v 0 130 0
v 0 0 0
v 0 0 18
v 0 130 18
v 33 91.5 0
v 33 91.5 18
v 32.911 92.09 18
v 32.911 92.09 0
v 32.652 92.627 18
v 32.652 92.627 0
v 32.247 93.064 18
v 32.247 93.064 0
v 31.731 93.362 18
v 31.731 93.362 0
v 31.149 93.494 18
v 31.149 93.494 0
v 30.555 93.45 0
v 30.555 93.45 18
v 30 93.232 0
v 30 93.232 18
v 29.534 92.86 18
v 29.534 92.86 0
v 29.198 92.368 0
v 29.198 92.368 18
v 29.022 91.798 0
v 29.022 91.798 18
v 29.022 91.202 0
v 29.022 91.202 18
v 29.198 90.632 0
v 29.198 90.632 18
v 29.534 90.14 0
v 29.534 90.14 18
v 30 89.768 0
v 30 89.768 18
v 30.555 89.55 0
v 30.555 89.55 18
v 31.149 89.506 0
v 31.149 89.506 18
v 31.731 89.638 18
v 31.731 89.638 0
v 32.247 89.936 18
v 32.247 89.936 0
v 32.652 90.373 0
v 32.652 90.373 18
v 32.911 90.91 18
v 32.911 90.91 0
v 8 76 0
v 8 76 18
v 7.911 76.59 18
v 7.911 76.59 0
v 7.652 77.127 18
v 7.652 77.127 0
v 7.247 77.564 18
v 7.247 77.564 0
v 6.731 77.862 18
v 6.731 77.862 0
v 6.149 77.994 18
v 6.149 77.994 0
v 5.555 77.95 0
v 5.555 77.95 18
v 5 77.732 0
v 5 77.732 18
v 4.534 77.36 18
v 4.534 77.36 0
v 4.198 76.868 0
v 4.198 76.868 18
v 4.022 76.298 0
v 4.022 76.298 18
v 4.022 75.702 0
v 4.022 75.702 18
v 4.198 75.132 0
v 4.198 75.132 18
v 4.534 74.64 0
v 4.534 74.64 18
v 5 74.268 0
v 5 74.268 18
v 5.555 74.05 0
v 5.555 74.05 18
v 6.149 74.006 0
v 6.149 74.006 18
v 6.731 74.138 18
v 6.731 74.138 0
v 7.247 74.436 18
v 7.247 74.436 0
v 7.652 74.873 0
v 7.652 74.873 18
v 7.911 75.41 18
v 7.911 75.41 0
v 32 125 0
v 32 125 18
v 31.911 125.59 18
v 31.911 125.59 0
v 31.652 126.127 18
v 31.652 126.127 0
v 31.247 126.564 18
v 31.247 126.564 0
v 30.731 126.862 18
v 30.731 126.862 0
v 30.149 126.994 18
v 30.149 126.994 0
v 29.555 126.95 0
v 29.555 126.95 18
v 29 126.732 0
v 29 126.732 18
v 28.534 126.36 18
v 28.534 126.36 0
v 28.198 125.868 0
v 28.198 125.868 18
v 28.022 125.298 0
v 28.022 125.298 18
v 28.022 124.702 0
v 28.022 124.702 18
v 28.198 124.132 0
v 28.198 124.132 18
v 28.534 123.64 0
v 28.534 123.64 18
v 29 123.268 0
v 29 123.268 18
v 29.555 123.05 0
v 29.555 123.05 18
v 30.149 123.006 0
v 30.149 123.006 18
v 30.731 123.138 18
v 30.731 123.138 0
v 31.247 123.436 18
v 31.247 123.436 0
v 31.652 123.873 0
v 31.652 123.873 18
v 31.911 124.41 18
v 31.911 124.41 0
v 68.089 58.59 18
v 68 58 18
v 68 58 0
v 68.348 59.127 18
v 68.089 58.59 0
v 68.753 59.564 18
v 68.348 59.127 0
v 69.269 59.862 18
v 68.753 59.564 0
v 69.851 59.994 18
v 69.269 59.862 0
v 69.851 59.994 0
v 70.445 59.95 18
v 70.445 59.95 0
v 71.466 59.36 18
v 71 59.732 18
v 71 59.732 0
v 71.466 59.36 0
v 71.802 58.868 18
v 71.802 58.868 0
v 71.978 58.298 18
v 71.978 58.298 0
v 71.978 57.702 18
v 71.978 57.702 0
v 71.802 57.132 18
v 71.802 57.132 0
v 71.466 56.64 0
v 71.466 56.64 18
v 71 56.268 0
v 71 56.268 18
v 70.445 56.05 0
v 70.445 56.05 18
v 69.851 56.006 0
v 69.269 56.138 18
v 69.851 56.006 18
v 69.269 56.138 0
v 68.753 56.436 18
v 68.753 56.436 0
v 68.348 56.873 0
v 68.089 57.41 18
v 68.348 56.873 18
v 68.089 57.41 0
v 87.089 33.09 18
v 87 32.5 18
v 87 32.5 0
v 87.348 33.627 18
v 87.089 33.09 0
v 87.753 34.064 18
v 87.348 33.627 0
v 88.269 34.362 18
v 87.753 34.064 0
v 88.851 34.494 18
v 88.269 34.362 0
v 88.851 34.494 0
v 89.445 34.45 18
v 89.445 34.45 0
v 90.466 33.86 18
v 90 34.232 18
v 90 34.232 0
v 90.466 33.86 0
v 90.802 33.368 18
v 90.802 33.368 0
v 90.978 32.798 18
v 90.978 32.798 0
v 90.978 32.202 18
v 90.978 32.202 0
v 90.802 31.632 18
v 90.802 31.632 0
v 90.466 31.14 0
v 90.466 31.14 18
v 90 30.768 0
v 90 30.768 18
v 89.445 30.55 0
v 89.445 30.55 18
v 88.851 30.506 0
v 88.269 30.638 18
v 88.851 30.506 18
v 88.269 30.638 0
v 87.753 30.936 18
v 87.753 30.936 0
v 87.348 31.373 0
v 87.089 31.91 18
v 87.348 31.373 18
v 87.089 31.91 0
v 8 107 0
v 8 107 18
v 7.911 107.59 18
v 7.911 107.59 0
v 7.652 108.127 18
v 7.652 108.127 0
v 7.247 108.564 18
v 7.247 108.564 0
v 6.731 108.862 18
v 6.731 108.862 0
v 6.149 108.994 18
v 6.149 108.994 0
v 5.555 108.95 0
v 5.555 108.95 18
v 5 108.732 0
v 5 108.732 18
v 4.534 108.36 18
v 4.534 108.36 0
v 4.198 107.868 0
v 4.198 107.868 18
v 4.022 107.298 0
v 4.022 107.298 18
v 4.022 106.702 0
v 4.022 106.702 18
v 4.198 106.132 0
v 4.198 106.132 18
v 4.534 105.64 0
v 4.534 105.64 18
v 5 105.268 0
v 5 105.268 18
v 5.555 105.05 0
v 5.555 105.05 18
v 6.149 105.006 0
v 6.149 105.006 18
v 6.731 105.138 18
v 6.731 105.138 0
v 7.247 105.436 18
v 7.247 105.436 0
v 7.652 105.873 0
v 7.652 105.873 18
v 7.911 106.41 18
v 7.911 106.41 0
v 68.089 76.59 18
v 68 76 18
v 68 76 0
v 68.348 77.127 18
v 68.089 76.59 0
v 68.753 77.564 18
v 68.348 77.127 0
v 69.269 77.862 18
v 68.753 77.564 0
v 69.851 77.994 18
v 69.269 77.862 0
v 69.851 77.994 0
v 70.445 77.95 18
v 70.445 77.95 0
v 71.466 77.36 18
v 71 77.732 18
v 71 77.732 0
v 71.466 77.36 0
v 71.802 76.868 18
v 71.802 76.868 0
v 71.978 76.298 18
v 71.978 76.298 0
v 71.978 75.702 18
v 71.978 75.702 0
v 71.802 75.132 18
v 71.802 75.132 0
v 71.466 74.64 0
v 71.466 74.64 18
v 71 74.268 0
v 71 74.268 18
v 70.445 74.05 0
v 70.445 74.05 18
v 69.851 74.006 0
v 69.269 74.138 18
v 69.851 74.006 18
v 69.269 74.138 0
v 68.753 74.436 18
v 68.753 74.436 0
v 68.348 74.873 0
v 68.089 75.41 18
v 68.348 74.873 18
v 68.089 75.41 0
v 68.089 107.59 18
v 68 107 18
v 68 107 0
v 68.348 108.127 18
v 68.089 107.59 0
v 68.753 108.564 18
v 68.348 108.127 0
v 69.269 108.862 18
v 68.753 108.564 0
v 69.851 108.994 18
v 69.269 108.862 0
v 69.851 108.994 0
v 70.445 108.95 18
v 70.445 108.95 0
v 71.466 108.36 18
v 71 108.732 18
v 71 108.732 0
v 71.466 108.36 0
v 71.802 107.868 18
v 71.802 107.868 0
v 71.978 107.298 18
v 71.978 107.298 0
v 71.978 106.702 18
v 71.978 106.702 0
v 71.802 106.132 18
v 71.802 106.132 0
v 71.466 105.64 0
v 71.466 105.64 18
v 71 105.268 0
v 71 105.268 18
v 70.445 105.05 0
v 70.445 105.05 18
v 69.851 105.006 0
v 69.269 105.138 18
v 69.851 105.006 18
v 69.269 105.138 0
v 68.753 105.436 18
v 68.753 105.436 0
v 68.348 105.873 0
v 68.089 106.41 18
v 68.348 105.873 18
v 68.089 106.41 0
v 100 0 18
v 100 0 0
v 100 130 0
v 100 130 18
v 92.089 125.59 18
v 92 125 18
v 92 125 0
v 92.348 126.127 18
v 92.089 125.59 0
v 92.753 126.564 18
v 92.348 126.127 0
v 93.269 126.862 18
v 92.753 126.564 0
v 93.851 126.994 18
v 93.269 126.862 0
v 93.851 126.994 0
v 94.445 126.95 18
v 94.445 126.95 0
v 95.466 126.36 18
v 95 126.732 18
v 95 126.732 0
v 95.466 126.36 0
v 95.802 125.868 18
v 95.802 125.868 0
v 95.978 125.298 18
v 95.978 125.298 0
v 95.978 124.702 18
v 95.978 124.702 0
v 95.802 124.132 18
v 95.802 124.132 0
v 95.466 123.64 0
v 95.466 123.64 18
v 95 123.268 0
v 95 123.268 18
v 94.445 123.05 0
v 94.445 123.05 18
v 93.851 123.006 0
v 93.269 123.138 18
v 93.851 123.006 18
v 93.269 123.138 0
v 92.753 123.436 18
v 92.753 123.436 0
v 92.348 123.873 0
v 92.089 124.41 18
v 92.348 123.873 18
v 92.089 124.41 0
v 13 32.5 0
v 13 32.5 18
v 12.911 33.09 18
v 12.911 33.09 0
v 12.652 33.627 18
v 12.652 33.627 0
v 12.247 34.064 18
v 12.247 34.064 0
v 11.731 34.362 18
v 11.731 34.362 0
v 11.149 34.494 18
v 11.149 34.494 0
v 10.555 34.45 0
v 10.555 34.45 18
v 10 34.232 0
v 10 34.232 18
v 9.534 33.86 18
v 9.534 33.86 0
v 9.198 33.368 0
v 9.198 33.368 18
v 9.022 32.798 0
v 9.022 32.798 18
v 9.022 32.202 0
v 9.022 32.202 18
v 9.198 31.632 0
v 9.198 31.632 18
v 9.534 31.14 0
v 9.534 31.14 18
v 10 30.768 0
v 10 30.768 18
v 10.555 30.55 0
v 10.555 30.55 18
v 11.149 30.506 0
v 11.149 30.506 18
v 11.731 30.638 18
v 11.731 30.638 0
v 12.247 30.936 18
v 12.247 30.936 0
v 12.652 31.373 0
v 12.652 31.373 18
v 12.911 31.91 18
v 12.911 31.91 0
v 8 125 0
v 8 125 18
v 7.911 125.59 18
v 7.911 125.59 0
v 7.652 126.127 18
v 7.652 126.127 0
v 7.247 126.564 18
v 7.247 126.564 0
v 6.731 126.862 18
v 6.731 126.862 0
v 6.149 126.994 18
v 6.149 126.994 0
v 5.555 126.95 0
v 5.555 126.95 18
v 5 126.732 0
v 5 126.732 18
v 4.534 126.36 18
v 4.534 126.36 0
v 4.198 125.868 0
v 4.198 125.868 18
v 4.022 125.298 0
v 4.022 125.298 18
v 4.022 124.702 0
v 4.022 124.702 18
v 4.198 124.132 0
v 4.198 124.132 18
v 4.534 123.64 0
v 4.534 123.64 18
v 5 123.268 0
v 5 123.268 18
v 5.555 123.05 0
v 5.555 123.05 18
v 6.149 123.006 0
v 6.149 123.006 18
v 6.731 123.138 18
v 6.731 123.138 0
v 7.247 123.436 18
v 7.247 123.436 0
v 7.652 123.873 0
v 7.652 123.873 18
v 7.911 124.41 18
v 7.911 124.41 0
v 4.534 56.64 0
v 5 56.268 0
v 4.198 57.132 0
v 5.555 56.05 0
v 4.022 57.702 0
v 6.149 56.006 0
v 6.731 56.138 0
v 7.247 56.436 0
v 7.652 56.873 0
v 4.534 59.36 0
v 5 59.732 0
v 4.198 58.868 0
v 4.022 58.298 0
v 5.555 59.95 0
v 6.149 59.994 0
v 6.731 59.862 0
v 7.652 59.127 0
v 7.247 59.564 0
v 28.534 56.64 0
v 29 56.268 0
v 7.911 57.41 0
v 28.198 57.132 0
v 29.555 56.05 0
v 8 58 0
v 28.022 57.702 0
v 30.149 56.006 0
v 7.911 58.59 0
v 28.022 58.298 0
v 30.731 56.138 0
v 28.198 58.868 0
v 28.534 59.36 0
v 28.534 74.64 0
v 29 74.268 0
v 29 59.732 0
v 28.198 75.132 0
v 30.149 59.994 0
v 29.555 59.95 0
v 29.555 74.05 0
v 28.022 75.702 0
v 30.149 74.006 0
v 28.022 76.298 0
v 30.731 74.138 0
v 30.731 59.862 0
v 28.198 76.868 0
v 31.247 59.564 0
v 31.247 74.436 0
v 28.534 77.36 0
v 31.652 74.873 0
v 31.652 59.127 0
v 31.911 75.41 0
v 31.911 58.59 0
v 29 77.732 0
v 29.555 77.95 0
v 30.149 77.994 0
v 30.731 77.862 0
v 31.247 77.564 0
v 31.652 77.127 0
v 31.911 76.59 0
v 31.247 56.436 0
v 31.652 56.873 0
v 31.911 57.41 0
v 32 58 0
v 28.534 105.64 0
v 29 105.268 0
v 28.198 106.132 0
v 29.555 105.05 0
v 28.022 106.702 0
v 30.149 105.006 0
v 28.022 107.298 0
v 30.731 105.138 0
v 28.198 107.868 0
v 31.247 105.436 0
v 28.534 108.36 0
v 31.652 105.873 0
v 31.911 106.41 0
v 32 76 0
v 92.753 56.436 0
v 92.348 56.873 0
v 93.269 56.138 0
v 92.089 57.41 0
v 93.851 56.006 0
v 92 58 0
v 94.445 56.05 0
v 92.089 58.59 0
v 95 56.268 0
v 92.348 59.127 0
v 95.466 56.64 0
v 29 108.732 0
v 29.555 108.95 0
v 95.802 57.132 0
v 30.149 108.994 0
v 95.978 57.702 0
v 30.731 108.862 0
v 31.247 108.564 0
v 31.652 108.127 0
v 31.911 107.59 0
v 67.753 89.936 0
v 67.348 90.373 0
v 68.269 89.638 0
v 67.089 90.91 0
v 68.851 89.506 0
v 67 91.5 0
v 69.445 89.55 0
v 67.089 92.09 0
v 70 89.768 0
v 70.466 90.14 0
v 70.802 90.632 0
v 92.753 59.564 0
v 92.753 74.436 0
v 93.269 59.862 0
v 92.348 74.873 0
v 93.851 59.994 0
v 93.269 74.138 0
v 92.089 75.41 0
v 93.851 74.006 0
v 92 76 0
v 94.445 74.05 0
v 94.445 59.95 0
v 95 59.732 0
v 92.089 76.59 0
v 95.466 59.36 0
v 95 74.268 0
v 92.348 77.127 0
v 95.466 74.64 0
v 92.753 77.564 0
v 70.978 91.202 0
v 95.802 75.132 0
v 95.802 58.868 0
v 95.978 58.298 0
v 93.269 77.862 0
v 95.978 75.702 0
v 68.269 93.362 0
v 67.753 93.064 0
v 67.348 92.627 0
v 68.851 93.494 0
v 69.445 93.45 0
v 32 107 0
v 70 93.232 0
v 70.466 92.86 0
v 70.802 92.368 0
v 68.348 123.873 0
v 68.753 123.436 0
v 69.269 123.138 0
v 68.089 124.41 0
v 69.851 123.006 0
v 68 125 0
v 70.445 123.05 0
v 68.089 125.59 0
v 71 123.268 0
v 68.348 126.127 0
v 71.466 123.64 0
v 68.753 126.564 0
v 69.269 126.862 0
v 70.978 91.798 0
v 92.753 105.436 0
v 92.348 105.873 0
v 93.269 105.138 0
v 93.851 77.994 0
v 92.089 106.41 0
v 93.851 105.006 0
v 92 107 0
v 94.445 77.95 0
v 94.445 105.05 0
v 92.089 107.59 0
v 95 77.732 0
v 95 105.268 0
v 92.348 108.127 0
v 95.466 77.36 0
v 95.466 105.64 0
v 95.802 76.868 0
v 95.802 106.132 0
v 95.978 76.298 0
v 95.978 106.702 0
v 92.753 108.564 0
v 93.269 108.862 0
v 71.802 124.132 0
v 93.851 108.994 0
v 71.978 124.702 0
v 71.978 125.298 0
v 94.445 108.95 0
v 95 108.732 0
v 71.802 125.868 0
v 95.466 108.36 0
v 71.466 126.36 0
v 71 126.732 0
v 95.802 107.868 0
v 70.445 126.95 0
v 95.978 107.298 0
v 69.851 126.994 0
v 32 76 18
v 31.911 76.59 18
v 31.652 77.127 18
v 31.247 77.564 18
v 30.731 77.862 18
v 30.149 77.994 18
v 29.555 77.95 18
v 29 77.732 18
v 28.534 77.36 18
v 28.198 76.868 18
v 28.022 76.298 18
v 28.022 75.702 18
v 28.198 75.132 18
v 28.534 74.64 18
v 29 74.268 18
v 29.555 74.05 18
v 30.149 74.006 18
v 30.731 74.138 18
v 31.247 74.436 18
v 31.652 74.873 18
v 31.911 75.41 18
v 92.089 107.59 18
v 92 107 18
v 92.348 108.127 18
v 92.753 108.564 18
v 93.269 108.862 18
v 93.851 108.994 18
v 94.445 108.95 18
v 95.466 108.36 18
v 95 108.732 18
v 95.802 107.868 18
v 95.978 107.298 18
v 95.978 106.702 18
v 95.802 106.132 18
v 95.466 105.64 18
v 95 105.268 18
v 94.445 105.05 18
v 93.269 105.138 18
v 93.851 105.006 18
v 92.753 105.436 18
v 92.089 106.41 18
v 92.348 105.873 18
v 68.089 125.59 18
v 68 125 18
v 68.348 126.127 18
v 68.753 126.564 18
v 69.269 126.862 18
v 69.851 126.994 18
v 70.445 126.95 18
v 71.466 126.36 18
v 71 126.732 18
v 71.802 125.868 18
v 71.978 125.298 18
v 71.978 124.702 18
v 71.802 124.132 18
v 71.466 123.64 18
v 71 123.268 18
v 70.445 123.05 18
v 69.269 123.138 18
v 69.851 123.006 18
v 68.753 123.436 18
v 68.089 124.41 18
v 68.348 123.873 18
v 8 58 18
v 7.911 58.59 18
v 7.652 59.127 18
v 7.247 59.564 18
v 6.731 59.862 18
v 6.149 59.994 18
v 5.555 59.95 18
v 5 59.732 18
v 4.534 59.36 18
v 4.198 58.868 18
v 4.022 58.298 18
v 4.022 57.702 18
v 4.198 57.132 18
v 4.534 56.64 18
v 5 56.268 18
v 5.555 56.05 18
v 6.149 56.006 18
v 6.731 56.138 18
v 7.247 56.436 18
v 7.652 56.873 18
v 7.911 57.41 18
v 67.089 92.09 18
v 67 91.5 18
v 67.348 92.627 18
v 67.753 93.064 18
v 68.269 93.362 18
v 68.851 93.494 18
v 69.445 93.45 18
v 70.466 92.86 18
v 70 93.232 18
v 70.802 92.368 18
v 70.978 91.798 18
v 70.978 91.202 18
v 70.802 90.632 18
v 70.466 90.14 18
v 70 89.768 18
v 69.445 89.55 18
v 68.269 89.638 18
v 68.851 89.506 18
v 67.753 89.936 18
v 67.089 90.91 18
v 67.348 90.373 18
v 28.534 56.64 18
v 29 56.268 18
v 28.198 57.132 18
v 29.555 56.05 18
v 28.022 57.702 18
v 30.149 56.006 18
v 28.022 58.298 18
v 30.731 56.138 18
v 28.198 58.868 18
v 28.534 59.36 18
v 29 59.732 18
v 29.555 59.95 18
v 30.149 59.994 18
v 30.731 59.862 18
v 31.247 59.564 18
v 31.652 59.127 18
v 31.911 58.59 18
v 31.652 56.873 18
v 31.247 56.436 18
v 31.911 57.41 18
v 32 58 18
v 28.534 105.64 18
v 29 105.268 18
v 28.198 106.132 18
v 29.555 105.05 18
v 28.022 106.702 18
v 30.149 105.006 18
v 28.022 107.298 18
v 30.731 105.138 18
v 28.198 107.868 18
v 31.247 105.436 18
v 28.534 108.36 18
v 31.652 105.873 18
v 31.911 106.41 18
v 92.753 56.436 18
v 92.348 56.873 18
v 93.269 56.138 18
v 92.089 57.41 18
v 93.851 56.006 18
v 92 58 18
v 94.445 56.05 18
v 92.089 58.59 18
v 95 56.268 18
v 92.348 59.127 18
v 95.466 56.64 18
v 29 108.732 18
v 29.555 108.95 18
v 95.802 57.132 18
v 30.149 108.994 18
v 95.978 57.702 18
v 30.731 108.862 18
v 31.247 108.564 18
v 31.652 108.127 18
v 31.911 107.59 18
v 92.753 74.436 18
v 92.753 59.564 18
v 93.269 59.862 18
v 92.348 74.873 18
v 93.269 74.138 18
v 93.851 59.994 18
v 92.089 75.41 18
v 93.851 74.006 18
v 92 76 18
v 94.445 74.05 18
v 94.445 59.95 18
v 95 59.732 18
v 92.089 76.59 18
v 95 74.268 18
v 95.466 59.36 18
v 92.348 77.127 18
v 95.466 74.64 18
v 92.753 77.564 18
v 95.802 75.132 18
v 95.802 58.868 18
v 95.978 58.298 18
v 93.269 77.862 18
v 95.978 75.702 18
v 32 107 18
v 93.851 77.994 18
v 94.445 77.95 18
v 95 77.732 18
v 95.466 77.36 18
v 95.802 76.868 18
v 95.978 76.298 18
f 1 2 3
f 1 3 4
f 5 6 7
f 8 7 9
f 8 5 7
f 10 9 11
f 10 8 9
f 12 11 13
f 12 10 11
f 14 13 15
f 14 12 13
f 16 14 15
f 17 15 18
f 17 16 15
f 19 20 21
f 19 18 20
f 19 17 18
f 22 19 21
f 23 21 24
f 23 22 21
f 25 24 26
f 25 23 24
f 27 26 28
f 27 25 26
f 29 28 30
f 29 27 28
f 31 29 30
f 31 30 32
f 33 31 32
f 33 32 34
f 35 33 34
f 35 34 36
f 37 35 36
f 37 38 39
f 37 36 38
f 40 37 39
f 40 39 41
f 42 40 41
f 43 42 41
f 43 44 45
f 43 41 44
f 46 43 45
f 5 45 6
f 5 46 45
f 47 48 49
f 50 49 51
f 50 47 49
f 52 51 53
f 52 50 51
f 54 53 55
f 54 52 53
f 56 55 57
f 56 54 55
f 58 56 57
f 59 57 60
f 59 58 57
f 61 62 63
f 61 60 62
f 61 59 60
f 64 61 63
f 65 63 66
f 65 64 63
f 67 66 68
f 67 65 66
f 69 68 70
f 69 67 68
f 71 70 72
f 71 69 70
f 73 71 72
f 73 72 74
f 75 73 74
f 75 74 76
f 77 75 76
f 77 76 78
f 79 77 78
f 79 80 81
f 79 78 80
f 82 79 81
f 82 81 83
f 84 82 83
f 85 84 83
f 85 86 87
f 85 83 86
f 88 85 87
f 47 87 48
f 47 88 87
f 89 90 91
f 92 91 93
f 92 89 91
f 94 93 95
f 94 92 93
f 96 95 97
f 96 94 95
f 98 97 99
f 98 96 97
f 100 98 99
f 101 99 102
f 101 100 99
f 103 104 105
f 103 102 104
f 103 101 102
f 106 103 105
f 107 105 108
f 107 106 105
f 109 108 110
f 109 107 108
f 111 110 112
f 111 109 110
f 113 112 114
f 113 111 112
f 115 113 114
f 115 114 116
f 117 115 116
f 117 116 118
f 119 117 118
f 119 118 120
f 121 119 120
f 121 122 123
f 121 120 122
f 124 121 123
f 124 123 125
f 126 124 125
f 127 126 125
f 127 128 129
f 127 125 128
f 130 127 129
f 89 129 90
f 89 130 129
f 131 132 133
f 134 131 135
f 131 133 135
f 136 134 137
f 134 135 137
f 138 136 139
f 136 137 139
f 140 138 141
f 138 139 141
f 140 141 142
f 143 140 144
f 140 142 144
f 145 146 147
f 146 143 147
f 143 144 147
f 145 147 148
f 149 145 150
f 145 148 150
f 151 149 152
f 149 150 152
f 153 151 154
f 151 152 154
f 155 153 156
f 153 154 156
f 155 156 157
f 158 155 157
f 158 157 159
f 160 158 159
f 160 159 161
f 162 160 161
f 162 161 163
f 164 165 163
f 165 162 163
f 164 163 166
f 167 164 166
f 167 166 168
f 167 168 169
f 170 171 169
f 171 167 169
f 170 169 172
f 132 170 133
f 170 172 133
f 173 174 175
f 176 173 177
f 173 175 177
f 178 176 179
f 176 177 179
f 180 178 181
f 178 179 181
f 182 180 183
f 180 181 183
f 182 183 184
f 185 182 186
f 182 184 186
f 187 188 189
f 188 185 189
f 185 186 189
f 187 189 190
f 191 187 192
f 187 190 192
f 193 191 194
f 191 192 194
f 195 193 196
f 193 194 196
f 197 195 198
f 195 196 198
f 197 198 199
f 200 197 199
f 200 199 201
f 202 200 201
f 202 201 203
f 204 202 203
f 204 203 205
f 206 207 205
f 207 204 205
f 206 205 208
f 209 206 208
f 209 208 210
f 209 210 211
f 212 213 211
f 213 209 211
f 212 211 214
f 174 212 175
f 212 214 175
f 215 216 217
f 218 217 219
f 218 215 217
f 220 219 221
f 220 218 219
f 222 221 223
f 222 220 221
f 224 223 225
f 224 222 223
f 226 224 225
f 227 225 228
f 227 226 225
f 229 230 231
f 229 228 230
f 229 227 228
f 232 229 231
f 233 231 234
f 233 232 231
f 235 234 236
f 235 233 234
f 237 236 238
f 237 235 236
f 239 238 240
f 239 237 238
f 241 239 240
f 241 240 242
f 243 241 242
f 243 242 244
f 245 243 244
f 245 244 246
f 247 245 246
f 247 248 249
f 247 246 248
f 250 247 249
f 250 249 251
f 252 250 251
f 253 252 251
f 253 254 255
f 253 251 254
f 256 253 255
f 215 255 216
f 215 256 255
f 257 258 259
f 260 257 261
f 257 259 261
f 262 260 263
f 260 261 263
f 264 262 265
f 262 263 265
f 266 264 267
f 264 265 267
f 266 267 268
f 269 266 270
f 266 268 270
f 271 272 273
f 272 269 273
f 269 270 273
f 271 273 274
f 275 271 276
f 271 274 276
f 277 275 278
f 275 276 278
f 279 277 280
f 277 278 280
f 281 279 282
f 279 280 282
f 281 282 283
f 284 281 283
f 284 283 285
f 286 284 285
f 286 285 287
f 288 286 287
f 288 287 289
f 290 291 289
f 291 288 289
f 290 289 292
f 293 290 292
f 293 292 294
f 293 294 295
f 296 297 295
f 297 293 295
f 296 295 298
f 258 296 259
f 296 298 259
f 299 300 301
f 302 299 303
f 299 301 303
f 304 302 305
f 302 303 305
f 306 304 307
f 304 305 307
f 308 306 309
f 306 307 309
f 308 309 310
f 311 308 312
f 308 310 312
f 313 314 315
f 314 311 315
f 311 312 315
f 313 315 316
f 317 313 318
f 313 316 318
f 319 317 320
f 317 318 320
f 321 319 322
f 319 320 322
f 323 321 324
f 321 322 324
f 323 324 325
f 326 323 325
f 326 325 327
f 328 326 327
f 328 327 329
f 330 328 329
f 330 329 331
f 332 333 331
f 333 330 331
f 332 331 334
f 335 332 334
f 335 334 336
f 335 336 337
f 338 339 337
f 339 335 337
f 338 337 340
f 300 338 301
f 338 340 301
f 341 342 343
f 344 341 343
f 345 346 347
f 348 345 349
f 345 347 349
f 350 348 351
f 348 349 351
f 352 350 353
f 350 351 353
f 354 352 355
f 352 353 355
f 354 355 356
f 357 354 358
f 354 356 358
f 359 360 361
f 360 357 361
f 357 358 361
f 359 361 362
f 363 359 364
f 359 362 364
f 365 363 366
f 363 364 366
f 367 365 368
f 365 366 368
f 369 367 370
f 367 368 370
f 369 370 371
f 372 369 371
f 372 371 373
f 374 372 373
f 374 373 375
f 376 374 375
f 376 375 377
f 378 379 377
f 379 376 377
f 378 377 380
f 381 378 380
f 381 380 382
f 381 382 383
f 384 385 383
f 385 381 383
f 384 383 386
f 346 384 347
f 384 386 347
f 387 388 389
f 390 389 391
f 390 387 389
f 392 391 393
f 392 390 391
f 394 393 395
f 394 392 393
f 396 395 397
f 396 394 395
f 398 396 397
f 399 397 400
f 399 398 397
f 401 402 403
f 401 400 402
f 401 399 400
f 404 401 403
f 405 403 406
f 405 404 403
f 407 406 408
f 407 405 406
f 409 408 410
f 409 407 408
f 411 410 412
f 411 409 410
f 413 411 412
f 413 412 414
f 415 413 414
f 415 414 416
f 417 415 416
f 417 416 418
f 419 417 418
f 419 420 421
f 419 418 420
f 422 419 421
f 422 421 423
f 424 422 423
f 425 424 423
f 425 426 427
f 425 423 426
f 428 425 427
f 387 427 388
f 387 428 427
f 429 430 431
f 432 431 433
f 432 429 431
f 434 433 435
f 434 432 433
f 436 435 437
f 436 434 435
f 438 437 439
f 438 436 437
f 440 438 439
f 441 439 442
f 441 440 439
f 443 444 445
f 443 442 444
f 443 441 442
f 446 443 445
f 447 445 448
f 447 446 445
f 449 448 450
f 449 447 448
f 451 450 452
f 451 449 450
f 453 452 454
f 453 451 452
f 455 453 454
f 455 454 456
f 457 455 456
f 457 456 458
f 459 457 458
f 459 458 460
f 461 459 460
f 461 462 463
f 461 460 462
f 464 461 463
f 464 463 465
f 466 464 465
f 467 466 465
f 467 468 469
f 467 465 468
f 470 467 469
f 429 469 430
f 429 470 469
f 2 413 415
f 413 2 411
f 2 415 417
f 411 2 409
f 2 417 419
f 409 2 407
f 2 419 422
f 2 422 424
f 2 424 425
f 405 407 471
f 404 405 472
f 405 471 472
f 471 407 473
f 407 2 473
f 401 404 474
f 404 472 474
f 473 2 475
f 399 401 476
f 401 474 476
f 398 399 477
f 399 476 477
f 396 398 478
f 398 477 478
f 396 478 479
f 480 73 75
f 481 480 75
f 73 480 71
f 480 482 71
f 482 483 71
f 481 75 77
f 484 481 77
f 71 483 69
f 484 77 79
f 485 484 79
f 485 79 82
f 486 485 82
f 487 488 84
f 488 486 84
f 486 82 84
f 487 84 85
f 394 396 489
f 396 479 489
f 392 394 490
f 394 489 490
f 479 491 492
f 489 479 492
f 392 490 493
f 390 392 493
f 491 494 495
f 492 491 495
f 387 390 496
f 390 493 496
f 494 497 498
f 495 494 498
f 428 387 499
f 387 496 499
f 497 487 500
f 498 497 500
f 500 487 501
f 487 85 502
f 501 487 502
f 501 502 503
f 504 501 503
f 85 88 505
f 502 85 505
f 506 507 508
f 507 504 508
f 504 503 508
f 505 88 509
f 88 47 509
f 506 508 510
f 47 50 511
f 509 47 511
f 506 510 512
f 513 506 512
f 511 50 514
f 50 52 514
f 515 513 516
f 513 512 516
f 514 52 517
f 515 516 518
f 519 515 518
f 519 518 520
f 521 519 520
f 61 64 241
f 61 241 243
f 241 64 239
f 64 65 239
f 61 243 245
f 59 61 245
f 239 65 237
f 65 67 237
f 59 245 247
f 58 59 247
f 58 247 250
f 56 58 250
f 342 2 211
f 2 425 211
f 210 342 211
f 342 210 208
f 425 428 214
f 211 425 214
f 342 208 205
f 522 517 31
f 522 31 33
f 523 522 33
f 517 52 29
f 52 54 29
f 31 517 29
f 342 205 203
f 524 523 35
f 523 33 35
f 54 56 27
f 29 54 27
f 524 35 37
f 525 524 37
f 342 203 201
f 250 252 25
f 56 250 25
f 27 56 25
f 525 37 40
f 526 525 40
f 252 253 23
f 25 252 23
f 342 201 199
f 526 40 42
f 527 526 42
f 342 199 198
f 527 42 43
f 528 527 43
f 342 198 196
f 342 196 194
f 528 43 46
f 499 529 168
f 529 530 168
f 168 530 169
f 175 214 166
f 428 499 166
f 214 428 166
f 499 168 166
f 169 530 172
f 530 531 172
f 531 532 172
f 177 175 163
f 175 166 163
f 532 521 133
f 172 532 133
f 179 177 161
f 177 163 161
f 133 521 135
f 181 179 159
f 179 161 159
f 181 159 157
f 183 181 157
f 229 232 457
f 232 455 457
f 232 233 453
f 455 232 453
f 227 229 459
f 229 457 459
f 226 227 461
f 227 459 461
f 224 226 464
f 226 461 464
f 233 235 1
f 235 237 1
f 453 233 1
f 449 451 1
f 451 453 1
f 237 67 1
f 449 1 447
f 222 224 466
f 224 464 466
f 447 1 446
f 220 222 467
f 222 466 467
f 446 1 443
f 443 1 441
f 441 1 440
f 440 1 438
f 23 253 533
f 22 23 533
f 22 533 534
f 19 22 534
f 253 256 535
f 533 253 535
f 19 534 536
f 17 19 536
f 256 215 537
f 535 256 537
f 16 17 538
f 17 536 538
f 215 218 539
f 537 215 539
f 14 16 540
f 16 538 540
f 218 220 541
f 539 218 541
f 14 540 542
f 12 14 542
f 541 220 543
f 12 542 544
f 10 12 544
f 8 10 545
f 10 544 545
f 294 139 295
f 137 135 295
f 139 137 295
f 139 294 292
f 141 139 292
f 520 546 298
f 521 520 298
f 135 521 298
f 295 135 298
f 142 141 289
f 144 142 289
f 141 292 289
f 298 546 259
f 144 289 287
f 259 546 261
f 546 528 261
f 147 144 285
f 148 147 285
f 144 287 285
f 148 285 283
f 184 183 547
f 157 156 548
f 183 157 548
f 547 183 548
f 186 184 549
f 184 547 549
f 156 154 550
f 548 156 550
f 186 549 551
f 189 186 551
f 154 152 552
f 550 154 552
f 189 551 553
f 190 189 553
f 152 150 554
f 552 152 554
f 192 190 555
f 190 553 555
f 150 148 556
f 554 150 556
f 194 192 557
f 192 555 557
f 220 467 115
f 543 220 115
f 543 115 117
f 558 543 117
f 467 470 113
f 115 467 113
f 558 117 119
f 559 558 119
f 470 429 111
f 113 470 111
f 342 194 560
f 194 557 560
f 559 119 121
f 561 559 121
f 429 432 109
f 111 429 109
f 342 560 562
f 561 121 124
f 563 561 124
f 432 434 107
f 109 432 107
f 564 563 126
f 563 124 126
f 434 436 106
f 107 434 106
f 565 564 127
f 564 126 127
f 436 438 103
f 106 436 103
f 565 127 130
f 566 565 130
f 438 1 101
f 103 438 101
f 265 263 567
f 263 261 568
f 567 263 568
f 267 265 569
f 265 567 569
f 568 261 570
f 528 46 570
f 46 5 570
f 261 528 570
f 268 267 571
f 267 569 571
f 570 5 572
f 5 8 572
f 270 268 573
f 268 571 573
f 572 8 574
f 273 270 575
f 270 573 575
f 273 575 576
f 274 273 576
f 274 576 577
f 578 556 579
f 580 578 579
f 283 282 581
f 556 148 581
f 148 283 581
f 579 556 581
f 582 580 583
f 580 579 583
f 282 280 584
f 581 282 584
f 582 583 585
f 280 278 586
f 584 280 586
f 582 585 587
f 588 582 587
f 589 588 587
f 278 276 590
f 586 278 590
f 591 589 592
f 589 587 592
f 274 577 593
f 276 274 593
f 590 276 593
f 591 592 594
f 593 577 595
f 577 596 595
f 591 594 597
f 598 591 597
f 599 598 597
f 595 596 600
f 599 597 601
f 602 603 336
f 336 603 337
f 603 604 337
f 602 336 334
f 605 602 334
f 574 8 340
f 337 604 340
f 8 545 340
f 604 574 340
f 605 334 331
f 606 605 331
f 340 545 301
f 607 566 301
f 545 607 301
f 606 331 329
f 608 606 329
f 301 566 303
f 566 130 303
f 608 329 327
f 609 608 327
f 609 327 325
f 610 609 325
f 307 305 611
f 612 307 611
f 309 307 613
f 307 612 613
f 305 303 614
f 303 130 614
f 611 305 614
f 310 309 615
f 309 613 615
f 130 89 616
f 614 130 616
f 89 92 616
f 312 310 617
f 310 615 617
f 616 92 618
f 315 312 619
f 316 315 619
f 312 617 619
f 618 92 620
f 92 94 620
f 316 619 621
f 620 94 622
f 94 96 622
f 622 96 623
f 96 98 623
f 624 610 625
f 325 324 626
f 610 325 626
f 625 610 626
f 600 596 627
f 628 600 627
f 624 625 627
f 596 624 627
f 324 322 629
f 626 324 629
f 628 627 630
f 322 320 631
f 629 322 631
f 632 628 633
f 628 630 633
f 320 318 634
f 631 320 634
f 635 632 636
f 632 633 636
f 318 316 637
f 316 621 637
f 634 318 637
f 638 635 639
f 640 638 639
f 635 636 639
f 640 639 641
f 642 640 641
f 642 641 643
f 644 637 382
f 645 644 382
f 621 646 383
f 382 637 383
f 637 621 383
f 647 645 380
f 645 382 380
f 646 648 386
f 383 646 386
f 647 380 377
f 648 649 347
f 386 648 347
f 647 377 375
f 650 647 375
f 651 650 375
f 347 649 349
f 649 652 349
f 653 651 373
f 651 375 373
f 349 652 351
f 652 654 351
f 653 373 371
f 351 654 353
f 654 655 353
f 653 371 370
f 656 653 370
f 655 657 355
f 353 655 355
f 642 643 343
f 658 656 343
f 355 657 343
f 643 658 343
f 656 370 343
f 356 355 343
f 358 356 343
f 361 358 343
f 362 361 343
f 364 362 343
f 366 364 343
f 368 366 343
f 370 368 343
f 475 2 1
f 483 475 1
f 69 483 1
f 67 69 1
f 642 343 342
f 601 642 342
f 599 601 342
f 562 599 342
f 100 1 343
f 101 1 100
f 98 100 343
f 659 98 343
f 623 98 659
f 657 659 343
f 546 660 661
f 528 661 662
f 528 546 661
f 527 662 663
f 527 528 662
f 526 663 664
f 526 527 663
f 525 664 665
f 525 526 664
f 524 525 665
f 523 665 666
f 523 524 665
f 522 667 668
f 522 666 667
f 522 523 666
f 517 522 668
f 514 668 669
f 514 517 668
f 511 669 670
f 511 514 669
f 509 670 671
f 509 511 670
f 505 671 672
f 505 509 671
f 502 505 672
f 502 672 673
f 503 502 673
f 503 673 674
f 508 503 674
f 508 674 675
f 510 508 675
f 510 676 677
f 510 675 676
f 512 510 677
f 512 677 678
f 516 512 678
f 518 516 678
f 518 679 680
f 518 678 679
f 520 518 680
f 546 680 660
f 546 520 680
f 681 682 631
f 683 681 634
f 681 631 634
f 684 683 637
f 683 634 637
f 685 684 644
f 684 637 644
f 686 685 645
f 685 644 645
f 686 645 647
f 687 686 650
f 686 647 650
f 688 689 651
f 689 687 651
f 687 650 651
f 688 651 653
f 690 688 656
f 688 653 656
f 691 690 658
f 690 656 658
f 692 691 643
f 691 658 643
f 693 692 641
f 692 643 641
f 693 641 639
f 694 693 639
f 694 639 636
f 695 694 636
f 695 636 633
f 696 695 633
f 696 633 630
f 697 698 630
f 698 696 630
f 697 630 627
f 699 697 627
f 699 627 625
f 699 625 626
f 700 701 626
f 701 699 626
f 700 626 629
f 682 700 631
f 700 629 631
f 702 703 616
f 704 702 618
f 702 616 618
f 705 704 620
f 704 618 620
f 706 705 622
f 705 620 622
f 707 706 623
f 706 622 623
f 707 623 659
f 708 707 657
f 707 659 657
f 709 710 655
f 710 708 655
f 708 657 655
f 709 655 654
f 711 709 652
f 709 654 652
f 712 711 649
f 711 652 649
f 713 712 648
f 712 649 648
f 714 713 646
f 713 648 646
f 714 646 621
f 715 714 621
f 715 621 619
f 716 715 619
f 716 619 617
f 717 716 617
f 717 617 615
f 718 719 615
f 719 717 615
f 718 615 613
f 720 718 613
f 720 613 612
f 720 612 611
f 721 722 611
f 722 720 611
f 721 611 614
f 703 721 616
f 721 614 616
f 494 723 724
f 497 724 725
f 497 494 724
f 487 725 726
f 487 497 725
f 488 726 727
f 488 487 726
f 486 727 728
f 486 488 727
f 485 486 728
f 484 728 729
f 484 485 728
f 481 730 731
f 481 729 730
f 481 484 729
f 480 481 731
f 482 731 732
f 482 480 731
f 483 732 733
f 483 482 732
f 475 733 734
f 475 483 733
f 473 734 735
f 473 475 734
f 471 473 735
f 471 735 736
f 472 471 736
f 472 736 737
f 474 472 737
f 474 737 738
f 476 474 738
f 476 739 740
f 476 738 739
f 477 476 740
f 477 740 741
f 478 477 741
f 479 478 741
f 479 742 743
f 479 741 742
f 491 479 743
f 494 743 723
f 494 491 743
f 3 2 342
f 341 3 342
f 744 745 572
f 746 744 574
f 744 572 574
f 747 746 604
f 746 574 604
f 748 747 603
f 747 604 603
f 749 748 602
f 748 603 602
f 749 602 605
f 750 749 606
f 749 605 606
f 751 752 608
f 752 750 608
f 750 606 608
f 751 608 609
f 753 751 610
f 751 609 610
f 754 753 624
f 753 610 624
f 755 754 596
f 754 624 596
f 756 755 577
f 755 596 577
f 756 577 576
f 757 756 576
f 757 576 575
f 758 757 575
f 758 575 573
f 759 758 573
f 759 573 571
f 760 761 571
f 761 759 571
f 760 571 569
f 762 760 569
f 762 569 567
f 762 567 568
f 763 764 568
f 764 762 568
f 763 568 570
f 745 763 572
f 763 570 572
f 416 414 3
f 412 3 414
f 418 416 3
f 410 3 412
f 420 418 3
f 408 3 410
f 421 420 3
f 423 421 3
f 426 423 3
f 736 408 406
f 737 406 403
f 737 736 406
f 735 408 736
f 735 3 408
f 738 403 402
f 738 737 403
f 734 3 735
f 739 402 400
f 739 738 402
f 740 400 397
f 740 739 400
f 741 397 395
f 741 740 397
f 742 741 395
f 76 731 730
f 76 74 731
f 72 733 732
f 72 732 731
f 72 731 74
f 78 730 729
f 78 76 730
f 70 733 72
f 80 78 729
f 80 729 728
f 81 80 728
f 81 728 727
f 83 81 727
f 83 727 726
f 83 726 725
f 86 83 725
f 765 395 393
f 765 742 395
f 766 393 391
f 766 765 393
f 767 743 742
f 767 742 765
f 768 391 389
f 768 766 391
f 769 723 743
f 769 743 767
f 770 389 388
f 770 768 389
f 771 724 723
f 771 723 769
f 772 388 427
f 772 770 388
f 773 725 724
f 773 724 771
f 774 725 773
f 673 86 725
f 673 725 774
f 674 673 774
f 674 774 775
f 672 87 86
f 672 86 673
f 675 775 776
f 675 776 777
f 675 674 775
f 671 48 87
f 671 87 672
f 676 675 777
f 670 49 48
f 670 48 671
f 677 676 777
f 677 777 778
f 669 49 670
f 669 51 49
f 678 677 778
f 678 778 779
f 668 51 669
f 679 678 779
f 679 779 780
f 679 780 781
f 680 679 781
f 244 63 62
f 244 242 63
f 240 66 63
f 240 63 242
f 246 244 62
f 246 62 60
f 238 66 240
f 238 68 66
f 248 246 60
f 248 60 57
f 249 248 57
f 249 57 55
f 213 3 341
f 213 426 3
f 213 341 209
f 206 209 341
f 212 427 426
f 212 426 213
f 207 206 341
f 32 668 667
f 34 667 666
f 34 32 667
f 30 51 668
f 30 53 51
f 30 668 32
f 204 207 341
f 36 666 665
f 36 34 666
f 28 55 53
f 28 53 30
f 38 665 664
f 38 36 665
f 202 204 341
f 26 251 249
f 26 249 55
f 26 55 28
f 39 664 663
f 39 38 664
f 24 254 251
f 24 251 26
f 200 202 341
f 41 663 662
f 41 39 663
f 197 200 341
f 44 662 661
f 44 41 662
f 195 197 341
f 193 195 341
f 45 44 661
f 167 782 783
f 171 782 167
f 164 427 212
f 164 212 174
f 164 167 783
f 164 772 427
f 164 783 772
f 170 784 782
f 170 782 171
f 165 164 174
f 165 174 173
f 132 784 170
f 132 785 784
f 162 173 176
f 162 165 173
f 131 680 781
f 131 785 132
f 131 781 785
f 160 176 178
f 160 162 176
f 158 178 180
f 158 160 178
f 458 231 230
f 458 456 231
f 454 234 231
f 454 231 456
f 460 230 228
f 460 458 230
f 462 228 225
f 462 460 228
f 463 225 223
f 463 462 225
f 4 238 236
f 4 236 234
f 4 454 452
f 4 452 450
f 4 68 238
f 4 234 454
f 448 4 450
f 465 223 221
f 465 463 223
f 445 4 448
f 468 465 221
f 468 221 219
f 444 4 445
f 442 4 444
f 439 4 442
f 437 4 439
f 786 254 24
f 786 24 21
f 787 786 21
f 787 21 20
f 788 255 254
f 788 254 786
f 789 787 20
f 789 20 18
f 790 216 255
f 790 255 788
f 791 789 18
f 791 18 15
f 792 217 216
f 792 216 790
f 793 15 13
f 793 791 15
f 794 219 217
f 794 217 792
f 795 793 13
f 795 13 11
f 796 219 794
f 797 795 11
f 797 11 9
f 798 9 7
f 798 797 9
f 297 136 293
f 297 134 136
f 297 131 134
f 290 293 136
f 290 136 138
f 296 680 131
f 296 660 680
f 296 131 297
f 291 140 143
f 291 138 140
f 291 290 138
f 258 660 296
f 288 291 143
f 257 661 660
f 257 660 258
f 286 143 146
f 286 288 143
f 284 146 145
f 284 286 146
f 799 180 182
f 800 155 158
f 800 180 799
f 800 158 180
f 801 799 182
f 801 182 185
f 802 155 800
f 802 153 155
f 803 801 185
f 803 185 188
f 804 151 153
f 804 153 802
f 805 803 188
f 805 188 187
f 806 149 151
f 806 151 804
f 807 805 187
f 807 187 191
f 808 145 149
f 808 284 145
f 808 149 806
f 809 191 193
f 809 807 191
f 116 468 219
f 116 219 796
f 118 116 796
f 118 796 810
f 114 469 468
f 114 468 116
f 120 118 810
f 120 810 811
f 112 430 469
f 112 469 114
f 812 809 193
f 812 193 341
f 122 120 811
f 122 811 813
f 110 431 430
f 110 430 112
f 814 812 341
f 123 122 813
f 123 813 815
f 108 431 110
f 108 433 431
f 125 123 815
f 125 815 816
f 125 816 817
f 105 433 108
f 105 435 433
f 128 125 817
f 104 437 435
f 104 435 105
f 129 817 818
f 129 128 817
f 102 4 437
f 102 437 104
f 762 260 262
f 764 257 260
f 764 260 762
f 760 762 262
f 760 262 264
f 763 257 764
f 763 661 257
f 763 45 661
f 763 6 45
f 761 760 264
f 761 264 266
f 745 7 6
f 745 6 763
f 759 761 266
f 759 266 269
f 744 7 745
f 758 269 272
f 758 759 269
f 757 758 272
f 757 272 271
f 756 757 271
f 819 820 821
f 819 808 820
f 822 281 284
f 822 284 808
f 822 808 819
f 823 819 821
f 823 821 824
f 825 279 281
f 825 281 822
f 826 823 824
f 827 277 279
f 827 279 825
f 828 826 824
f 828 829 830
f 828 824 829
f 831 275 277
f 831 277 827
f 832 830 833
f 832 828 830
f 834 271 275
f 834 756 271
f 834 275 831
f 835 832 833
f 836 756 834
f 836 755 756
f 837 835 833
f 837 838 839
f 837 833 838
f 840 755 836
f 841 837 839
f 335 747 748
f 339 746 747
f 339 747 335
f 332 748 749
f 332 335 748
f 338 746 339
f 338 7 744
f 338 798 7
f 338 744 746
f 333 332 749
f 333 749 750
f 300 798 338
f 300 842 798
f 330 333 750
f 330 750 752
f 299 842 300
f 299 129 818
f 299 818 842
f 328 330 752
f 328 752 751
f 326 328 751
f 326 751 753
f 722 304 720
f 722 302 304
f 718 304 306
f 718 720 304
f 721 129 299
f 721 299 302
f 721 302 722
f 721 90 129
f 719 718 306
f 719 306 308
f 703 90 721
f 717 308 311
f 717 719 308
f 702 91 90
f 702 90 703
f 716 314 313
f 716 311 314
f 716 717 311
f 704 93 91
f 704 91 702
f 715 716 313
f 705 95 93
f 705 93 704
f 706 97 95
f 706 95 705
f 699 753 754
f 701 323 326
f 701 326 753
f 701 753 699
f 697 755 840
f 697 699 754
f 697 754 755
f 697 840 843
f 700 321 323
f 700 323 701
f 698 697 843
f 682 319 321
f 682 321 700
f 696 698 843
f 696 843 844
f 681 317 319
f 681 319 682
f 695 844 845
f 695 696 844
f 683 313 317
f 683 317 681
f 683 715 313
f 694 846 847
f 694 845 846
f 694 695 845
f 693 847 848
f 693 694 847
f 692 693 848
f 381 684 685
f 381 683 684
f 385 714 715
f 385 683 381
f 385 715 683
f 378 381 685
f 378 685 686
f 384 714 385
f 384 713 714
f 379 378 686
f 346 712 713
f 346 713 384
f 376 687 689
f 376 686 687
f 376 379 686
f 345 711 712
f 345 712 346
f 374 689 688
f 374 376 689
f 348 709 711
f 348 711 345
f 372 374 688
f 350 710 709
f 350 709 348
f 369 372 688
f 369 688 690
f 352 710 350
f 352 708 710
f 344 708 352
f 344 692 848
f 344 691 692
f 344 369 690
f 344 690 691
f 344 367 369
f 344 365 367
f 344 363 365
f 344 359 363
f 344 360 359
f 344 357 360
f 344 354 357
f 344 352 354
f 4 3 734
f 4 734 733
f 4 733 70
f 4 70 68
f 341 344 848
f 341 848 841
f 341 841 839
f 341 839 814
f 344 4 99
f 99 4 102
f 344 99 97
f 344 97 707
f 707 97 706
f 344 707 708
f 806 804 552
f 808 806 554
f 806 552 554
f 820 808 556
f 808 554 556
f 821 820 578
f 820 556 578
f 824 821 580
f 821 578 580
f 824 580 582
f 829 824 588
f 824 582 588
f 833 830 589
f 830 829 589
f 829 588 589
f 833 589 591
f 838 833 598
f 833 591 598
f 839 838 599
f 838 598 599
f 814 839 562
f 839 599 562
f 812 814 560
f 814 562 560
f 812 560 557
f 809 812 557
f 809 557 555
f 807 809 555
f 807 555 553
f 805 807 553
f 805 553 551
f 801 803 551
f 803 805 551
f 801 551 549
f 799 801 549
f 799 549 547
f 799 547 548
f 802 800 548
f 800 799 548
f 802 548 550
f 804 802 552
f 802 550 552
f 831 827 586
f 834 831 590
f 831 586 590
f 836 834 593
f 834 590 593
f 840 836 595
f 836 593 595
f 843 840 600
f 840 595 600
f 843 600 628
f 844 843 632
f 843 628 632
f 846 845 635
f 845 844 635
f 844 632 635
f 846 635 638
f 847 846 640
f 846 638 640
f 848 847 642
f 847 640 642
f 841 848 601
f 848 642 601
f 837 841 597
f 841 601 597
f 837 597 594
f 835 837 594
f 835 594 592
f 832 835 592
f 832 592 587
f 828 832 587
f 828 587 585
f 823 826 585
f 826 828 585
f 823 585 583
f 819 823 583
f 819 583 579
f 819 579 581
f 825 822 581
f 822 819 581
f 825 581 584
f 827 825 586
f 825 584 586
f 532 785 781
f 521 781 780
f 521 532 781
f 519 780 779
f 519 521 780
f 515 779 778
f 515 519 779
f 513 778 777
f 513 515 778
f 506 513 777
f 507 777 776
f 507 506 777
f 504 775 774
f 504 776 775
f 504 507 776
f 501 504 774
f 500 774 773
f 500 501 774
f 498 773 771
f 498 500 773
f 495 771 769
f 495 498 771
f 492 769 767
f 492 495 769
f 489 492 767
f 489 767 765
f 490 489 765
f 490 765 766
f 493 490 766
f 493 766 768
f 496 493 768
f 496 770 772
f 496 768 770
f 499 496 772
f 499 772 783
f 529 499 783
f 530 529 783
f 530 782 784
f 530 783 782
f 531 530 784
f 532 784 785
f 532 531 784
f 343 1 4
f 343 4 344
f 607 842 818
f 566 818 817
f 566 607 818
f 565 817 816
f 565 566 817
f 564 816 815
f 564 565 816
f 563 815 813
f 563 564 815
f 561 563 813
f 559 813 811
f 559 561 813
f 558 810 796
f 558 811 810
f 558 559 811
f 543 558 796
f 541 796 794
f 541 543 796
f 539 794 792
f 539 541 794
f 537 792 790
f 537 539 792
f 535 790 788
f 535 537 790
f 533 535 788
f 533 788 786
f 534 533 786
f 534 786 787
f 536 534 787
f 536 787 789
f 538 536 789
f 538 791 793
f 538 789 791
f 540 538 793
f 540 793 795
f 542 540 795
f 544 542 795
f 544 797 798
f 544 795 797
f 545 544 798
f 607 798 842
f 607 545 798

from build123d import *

# Parameters (mm, degrees)
CYLINDER007_R     = 2
CYLINDER007_DEPTH = 25
CYLINDER008_R     = 2
CYLINDER008_DEPTH = 25
CYLINDER006_R     = 2
CYLINDER006_DEPTH = 25
CYLINDER009_R     = 2
CYLINDER009_DEPTH = 25
CYLINDER005_R     = 2
CYLINDER005_DEPTH = 25
CYLINDER002_R     = 2
CYLINDER002_DEPTH = 25
CYLINDER001_R     = 2
CYLINDER001_DEPTH = 25
CYLINDER_R        = 2
CYLINDER_DEPTH    = 25
CYLINDER003_R     = 2
CYLINDER003_DEPTH = 25
CYLINDER004_R     = 2
CYLINDER004_DEPTH = 25
BOX_W             = 50
BOX_H             = 130
BOX_DEPTH         = 18


with BuildPart() as cilindro007:
    # Cylinder007 → Cylinder007 (new body)
    with BuildSketch(Plane(origin=(6, 76, 0), x_dir=(1, 0, 0), z_dir=(0, 0, 1))):
        Circle(CYLINDER007_R)
    extrude(amount=CYLINDER007_DEPTH)


with BuildPart() as cilindro008:
    # Cylinder008 → Cylinder008 (new body)
    with BuildSketch(Plane(origin=(30, 58, 0), x_dir=(1, 0, 0), z_dir=(0, 0, 1))):
        Circle(CYLINDER008_R)
    extrude(amount=CYLINDER008_DEPTH)


with BuildPart() as cilindro006:
    # Cylinder006 → Cylinder006 (new body)
    with BuildSketch(Plane(origin=(6, 58, 0), x_dir=(1, 0, 0), z_dir=(0, 0, 1))):
        Circle(CYLINDER006_R)
    extrude(amount=CYLINDER006_DEPTH)


with BuildPart() as huecos001:
    # Cylinder009 → Cylinder009 (new body)
    with BuildSketch(Plane(origin=(30, 76, 0), x_dir=(1, 0, 0), z_dir=(0, 0, 1))):
        Circle(CYLINDER009_R)
    extrude(amount=CYLINDER009_DEPTH)

    # Fusion001: union Cilindro007, Cilindro008, Cilindro006
    add(cilindro007.part)
    add(cilindro008.part)
    add(cilindro006.part)


with BuildPart() as huecos001_1:
    # Fusion001 placement: moved
    add(huecos001.part.moved(Location((0, 49, 0))))


with BuildPart() as cilindro005:
    # Cylinder005 → Cylinder005 (new body)
    with BuildSketch(Plane(origin=(31, 91.5, 0), x_dir=(1, 0, 0), z_dir=(0, 0, 1))):
        Circle(CYLINDER005_R)
    extrude(amount=CYLINDER005_DEPTH)


with BuildPart() as cilindro002:
    # Cylinder002 → Cylinder002 (new body)
    with BuildSketch(Plane(origin=(6, 76, 0), x_dir=(1, 0, 0), z_dir=(0, 0, 1))):
        Circle(CYLINDER002_R)
    extrude(amount=CYLINDER002_DEPTH)


with BuildPart() as cilindro001:
    # Cylinder001 → Cylinder001 (new body)
    with BuildSketch(Plane(origin=(30, 58, 0), x_dir=(1, 0, 0), z_dir=(0, 0, 1))):
        Circle(CYLINDER001_R)
    extrude(amount=CYLINDER001_DEPTH)


with BuildPart() as cilindro:
    # Cylinder → Cylinder (new body)
    with BuildSketch(Plane(origin=(6, 58, 0), x_dir=(1, 0, 0), z_dir=(0, 0, 1))):
        Circle(CYLINDER_R)
    extrude(amount=CYLINDER_DEPTH)


with BuildPart() as huecos:
    # Cylinder003 → Cylinder003 (new body)
    with BuildSketch(Plane(origin=(30, 76, 0), x_dir=(1, 0, 0), z_dir=(0, 0, 1))):
        Circle(CYLINDER003_R)
    extrude(amount=CYLINDER003_DEPTH)

    # Fusion: union Cilindro002, Cilindro001, Cilindro
    add(cilindro002.part)
    add(cilindro001.part)
    add(cilindro.part)


with BuildPart() as cilindro004:
    # Cylinder004 → Cylinder004 (new body)
    with BuildSketch(Plane(origin=(11, 32.5, 0), x_dir=(1, 0, 0), z_dir=(0, 0, 1))):
        Circle(CYLINDER004_R)
    extrude(amount=CYLINDER004_DEPTH)


with BuildPart() as izquierda:
    # Box → Box (new body)
    with BuildSketch(Plane.XY):
        with Locations((25, 65)):
            Rectangle(BOX_W, BOX_H)
    extrude(amount=BOX_DEPTH)

    # Cut: cut Cilindro004
    add(cilindro004.part, mode=Mode.SUBTRACT)

    # Cut001: cut Huecos
    add(huecos.part, mode=Mode.SUBTRACT)

    # Cut002: cut Cilindro005
    add(cilindro005.part, mode=Mode.SUBTRACT)

    # Cut003: cut Huecos001
    add(huecos001_1.part, mode=Mode.SUBTRACT)


with BuildPart() as fusion002:
    # mirror: instance of Izquierda
    add(izquierda.part.mirror(Plane(origin=(50, 0, 0.197234), x_dir=(0, -1, 0), z_dir=(1, 0, 0))))

    # Fusion002: union Izquierda
    add(izquierda.part)


solid = fusion002.part
